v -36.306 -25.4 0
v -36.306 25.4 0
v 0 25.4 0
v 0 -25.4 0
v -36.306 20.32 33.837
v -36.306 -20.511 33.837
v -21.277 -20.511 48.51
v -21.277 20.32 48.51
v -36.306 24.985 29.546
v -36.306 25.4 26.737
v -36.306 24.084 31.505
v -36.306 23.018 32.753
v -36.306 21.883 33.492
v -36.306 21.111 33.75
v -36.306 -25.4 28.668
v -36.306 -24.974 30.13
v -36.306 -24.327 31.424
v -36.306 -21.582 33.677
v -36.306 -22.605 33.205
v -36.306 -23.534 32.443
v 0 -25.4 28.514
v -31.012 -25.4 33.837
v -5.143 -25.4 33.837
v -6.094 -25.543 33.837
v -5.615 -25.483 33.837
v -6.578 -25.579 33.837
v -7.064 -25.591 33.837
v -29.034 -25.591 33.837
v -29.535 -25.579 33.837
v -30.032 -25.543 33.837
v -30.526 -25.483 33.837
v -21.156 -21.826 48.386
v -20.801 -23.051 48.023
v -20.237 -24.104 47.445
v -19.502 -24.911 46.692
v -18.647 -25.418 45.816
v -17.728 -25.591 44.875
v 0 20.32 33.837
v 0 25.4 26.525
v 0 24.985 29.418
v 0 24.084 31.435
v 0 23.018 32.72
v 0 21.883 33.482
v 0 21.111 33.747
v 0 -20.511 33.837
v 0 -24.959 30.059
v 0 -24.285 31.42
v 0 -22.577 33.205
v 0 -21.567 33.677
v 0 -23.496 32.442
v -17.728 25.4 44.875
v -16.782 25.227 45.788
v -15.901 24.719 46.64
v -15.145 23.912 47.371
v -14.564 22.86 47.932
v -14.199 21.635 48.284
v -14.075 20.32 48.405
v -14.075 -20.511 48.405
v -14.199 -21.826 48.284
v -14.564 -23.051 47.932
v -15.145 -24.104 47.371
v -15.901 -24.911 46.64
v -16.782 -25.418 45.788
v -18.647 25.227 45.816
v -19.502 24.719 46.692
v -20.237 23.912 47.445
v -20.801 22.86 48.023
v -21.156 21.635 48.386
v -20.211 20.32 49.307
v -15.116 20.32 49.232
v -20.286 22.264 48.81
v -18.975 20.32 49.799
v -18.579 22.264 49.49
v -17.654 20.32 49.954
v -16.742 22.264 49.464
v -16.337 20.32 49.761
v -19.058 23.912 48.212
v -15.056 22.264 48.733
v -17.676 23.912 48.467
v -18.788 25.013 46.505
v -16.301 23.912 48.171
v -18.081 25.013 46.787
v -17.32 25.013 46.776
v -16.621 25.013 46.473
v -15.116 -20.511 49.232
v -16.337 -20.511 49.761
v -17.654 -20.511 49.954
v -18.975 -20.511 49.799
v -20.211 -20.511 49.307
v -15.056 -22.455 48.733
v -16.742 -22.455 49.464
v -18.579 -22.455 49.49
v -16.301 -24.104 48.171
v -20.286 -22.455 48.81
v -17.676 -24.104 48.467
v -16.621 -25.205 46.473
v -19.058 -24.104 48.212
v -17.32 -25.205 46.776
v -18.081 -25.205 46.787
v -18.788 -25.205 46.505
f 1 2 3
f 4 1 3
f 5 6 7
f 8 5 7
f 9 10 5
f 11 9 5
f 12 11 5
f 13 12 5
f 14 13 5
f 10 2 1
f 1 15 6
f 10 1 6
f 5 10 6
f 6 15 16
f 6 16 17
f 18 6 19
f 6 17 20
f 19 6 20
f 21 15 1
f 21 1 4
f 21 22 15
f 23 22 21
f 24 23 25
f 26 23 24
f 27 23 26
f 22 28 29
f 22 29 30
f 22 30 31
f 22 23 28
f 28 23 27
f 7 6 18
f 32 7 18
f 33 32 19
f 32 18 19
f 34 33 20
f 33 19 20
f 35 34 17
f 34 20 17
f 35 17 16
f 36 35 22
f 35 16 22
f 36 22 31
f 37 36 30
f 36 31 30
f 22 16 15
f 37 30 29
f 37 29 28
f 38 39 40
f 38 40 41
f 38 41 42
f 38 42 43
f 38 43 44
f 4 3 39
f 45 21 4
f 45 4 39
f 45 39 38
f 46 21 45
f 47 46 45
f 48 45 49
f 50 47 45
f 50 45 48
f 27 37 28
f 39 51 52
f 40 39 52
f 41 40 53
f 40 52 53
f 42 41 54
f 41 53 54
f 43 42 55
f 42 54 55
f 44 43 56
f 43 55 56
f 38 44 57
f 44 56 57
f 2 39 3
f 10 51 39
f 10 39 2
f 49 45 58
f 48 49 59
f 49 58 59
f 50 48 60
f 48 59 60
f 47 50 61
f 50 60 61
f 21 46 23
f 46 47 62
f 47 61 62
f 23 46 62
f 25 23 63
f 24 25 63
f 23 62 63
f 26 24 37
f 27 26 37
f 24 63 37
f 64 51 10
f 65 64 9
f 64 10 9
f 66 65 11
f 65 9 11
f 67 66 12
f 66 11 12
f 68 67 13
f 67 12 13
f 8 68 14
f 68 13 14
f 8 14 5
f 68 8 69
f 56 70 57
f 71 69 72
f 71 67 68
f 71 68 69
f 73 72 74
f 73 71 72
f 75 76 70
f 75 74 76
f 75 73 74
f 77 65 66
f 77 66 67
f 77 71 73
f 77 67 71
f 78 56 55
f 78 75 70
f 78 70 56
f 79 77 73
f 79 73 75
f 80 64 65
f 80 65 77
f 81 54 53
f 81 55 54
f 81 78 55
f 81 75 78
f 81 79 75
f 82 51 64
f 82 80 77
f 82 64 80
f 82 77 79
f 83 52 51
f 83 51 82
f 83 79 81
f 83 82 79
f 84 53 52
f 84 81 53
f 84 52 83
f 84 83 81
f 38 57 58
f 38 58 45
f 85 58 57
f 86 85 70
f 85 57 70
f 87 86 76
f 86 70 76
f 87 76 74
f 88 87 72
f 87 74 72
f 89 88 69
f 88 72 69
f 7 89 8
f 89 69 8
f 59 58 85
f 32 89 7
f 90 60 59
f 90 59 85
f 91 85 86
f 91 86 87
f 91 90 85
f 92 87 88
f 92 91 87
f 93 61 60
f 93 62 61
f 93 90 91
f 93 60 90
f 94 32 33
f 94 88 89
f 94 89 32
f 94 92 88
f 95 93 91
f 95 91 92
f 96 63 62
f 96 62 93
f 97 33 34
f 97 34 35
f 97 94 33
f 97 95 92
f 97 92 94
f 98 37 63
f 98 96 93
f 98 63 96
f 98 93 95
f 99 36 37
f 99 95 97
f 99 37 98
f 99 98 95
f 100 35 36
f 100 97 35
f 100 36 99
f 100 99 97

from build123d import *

# Parameters (mm, degrees)
F0_W         = 36.3061204553
F0_H         = 33.8365361094
F1_DEPTH     = 25.4
F5_DEPTH     = 50.99146
F7_T1_DEPTH  = 32.9564355705
F7_T3_DEPTH  = 33.7043488182
F7_T5_DEPTH  = 40.83146
F7_T10_DEPTH = 5.08
F7_T16_DEPTH = 5.08


# Not quite as in the source:
# - a fillet or chamfer that OpenCascade refuses, or shapes differently, is made with other operations: its cross-section is extruded or revolved along the edge and cut away or added
# - a feature of the source that left no trace in its solid (it failed there, or was rolled back) is left out


with BuildPart() as f1:
    # F0 (on Front) → F1 (new body, symmetric)
    with BuildSketch(Plane.XZ):
        with Locations((-18.1530602276, 16.9182680547)):
            Rectangle(F0_W, F0_H)
    extrude(amount=F1_DEPTH, both=True)

    # F3 (on face) → F5 (join)
    with BuildSketch(Plane(origin=(0, 25.4, 0), x_dir=(-1, 0, 0), z_dir=(0, 1, 0))):
        Polygon((36.3061204553, 33.8365361094), (17.6228713244, 52.0772151649), (0, 33.8365361094), align=None)
    extrude(amount=-F5_DEPTH)

    # F7: fillet of radius 5.08 on 5 edges, made by hand

    # F7_s2 → F7_t1 (cut)
    with BuildSketch(Plane(origin=(-30.9828597215, 0, 32.0690306362), x_dir=(0, 1, 0), z_dir=(0.6948226329, 0, -0.7191811377))):
        with BuildLine():
            ThreePointArc((-20.51146, 23.510391109), (-24.1035624484, 22.0224935574), (-25.59146, 18.430391109))
            Line((-25.59146, 18.430391109), (-25.59146, 23.510391109))
            Line((-25.59146, 23.510391109), (-20.51146, 23.510391109))
        make_face()
        with BuildLine():
            ThreePointArc((25.4, 18.430391109), (23.9121024484, 22.0224935574), (20.32, 23.510391109))
            Line((20.32, 23.510391109), (25.4, 23.510391109))
            Line((25.4, 23.510391109), (25.4, 18.430391109))
        make_face()
    extrude(amount=F7_T1_DEPTH, mode=Mode.SUBTRACT)

    # F7_s4 → F7_t3 (cut)
    with BuildSketch(Plane(origin=(-10.7619958041, 0, -10.507064916), x_dir=(0, 1, 0), z_dir=(0.7155307644, 0, 0.698581223))):
        with BuildLine():
            ThreePointArc((25.4, 44.4938565788), (23.9121024484, 48.0859590272), (20.32, 49.5738565788))
            Line((20.32, 49.5738565788), (25.4, 49.5738565788))
            Line((25.4, 49.5738565788), (25.4, 44.4938565788))
        make_face()
        with BuildLine():
            ThreePointArc((-20.51146, 49.5738565788), (-24.1035624484, 48.0859590272), (-25.59146, 44.4938565788))
            Line((-25.59146, 44.4938565788), (-25.59146, 49.5738565788))
            Line((-25.59146, 49.5738565788), (-20.51146, 49.5738565788))
        make_face()
    extrude(amount=F7_T3_DEPTH, mode=Mode.SUBTRACT)

    # F7_s6 → F7_t5 (cut)
    with BuildSketch(Plane.XZ.offset(-20.32)):
        with BuildLine():
            ThreePointArc((-14.074629897, 48.4045824879), (-17.6538784549, 49.9543417124), (-21.2768626893, 48.5097797958))
            Line((-21.2768626893, 48.5097797958), (-17.6228713244, 52.0772151649))
            Line((-17.6228713244, 52.0772151649), (-14.074629897, 48.4045824879))
        make_face()
    extrude(amount=F7_T5_DEPTH, mode=Mode.SUBTRACT)


with BuildPart() as f7_tool8:
    # F7_s9 → F7_t10 (new body)
    with BuildSketch(Plane.XZ.offset(20.51146)):
        Polygon((-17.7280700763, 44.8748835126), (-14.074629897, 48.4045824879), (-17.6228713244, 52.0772151649), (-21.2768626893, 48.5097797958), align=None)
    extrude(amount=F7_T10_DEPTH)

    # F7_s11 → F7_t12 (revolve, cut)
    with BuildSketch(Plane(origin=(-17.7280700763, -20.51146, 44.8748835126), x_dir=(-0.0146046499, 0, -0.9998933464), z_dir=(-0.9998933464, 0, 0.0146046499))):
        with BuildLine():
            ThreePointArc((0, -5.08), (5.08, 0), (0, 5.08))
            Line((0, 5.08), (0, -5.08))
        make_face()
    revolve(axis=Axis((-17.7280700763, -20.51146, 44.8748835126), (0, -1, 0)), mode=Mode.SUBTRACT)


with BuildPart() as f1_1:
    add(f1.part)

    # F7_t7: cut F7_tool8
    add(f7_tool8.part, mode=Mode.SUBTRACT)


with BuildPart() as f7_tool14:
    # F7_s15 → F7_t16 (new body)
    with BuildSketch(Plane.XZ.offset(-20.32)):
        Polygon((-17.7280700763, 44.8748835126), (-14.074629897, 48.4045824879), (-17.6228713244, 52.0772151649), (-21.2768626893, 48.5097797958), align=None)
    extrude(amount=-F7_T16_DEPTH)

    # F7_s17 → F7_t18 (revolve, cut)
    with BuildSketch(Plane(origin=(-17.7280700763, 20.32, 44.8748835126), x_dir=(-0.0146046499, 0, -0.9998933464), z_dir=(0.9998933464, 0, -0.0146046499))):
        with BuildLine():
            ThreePointArc((0, -5.08), (5.08, 0), (0, 5.08))
            Line((0, 5.08), (0, -5.08))
        make_face()
    revolve(axis=Axis((-17.7280700763, 20.32, 44.8748835126), (0, 1, 0)), mode=Mode.SUBTRACT)


with BuildPart() as f1_2:
    add(f1_1.part)

    # F7_t13: cut F7_tool14
    add(f7_tool14.part, mode=Mode.SUBTRACT)


solid = f1_2.part
